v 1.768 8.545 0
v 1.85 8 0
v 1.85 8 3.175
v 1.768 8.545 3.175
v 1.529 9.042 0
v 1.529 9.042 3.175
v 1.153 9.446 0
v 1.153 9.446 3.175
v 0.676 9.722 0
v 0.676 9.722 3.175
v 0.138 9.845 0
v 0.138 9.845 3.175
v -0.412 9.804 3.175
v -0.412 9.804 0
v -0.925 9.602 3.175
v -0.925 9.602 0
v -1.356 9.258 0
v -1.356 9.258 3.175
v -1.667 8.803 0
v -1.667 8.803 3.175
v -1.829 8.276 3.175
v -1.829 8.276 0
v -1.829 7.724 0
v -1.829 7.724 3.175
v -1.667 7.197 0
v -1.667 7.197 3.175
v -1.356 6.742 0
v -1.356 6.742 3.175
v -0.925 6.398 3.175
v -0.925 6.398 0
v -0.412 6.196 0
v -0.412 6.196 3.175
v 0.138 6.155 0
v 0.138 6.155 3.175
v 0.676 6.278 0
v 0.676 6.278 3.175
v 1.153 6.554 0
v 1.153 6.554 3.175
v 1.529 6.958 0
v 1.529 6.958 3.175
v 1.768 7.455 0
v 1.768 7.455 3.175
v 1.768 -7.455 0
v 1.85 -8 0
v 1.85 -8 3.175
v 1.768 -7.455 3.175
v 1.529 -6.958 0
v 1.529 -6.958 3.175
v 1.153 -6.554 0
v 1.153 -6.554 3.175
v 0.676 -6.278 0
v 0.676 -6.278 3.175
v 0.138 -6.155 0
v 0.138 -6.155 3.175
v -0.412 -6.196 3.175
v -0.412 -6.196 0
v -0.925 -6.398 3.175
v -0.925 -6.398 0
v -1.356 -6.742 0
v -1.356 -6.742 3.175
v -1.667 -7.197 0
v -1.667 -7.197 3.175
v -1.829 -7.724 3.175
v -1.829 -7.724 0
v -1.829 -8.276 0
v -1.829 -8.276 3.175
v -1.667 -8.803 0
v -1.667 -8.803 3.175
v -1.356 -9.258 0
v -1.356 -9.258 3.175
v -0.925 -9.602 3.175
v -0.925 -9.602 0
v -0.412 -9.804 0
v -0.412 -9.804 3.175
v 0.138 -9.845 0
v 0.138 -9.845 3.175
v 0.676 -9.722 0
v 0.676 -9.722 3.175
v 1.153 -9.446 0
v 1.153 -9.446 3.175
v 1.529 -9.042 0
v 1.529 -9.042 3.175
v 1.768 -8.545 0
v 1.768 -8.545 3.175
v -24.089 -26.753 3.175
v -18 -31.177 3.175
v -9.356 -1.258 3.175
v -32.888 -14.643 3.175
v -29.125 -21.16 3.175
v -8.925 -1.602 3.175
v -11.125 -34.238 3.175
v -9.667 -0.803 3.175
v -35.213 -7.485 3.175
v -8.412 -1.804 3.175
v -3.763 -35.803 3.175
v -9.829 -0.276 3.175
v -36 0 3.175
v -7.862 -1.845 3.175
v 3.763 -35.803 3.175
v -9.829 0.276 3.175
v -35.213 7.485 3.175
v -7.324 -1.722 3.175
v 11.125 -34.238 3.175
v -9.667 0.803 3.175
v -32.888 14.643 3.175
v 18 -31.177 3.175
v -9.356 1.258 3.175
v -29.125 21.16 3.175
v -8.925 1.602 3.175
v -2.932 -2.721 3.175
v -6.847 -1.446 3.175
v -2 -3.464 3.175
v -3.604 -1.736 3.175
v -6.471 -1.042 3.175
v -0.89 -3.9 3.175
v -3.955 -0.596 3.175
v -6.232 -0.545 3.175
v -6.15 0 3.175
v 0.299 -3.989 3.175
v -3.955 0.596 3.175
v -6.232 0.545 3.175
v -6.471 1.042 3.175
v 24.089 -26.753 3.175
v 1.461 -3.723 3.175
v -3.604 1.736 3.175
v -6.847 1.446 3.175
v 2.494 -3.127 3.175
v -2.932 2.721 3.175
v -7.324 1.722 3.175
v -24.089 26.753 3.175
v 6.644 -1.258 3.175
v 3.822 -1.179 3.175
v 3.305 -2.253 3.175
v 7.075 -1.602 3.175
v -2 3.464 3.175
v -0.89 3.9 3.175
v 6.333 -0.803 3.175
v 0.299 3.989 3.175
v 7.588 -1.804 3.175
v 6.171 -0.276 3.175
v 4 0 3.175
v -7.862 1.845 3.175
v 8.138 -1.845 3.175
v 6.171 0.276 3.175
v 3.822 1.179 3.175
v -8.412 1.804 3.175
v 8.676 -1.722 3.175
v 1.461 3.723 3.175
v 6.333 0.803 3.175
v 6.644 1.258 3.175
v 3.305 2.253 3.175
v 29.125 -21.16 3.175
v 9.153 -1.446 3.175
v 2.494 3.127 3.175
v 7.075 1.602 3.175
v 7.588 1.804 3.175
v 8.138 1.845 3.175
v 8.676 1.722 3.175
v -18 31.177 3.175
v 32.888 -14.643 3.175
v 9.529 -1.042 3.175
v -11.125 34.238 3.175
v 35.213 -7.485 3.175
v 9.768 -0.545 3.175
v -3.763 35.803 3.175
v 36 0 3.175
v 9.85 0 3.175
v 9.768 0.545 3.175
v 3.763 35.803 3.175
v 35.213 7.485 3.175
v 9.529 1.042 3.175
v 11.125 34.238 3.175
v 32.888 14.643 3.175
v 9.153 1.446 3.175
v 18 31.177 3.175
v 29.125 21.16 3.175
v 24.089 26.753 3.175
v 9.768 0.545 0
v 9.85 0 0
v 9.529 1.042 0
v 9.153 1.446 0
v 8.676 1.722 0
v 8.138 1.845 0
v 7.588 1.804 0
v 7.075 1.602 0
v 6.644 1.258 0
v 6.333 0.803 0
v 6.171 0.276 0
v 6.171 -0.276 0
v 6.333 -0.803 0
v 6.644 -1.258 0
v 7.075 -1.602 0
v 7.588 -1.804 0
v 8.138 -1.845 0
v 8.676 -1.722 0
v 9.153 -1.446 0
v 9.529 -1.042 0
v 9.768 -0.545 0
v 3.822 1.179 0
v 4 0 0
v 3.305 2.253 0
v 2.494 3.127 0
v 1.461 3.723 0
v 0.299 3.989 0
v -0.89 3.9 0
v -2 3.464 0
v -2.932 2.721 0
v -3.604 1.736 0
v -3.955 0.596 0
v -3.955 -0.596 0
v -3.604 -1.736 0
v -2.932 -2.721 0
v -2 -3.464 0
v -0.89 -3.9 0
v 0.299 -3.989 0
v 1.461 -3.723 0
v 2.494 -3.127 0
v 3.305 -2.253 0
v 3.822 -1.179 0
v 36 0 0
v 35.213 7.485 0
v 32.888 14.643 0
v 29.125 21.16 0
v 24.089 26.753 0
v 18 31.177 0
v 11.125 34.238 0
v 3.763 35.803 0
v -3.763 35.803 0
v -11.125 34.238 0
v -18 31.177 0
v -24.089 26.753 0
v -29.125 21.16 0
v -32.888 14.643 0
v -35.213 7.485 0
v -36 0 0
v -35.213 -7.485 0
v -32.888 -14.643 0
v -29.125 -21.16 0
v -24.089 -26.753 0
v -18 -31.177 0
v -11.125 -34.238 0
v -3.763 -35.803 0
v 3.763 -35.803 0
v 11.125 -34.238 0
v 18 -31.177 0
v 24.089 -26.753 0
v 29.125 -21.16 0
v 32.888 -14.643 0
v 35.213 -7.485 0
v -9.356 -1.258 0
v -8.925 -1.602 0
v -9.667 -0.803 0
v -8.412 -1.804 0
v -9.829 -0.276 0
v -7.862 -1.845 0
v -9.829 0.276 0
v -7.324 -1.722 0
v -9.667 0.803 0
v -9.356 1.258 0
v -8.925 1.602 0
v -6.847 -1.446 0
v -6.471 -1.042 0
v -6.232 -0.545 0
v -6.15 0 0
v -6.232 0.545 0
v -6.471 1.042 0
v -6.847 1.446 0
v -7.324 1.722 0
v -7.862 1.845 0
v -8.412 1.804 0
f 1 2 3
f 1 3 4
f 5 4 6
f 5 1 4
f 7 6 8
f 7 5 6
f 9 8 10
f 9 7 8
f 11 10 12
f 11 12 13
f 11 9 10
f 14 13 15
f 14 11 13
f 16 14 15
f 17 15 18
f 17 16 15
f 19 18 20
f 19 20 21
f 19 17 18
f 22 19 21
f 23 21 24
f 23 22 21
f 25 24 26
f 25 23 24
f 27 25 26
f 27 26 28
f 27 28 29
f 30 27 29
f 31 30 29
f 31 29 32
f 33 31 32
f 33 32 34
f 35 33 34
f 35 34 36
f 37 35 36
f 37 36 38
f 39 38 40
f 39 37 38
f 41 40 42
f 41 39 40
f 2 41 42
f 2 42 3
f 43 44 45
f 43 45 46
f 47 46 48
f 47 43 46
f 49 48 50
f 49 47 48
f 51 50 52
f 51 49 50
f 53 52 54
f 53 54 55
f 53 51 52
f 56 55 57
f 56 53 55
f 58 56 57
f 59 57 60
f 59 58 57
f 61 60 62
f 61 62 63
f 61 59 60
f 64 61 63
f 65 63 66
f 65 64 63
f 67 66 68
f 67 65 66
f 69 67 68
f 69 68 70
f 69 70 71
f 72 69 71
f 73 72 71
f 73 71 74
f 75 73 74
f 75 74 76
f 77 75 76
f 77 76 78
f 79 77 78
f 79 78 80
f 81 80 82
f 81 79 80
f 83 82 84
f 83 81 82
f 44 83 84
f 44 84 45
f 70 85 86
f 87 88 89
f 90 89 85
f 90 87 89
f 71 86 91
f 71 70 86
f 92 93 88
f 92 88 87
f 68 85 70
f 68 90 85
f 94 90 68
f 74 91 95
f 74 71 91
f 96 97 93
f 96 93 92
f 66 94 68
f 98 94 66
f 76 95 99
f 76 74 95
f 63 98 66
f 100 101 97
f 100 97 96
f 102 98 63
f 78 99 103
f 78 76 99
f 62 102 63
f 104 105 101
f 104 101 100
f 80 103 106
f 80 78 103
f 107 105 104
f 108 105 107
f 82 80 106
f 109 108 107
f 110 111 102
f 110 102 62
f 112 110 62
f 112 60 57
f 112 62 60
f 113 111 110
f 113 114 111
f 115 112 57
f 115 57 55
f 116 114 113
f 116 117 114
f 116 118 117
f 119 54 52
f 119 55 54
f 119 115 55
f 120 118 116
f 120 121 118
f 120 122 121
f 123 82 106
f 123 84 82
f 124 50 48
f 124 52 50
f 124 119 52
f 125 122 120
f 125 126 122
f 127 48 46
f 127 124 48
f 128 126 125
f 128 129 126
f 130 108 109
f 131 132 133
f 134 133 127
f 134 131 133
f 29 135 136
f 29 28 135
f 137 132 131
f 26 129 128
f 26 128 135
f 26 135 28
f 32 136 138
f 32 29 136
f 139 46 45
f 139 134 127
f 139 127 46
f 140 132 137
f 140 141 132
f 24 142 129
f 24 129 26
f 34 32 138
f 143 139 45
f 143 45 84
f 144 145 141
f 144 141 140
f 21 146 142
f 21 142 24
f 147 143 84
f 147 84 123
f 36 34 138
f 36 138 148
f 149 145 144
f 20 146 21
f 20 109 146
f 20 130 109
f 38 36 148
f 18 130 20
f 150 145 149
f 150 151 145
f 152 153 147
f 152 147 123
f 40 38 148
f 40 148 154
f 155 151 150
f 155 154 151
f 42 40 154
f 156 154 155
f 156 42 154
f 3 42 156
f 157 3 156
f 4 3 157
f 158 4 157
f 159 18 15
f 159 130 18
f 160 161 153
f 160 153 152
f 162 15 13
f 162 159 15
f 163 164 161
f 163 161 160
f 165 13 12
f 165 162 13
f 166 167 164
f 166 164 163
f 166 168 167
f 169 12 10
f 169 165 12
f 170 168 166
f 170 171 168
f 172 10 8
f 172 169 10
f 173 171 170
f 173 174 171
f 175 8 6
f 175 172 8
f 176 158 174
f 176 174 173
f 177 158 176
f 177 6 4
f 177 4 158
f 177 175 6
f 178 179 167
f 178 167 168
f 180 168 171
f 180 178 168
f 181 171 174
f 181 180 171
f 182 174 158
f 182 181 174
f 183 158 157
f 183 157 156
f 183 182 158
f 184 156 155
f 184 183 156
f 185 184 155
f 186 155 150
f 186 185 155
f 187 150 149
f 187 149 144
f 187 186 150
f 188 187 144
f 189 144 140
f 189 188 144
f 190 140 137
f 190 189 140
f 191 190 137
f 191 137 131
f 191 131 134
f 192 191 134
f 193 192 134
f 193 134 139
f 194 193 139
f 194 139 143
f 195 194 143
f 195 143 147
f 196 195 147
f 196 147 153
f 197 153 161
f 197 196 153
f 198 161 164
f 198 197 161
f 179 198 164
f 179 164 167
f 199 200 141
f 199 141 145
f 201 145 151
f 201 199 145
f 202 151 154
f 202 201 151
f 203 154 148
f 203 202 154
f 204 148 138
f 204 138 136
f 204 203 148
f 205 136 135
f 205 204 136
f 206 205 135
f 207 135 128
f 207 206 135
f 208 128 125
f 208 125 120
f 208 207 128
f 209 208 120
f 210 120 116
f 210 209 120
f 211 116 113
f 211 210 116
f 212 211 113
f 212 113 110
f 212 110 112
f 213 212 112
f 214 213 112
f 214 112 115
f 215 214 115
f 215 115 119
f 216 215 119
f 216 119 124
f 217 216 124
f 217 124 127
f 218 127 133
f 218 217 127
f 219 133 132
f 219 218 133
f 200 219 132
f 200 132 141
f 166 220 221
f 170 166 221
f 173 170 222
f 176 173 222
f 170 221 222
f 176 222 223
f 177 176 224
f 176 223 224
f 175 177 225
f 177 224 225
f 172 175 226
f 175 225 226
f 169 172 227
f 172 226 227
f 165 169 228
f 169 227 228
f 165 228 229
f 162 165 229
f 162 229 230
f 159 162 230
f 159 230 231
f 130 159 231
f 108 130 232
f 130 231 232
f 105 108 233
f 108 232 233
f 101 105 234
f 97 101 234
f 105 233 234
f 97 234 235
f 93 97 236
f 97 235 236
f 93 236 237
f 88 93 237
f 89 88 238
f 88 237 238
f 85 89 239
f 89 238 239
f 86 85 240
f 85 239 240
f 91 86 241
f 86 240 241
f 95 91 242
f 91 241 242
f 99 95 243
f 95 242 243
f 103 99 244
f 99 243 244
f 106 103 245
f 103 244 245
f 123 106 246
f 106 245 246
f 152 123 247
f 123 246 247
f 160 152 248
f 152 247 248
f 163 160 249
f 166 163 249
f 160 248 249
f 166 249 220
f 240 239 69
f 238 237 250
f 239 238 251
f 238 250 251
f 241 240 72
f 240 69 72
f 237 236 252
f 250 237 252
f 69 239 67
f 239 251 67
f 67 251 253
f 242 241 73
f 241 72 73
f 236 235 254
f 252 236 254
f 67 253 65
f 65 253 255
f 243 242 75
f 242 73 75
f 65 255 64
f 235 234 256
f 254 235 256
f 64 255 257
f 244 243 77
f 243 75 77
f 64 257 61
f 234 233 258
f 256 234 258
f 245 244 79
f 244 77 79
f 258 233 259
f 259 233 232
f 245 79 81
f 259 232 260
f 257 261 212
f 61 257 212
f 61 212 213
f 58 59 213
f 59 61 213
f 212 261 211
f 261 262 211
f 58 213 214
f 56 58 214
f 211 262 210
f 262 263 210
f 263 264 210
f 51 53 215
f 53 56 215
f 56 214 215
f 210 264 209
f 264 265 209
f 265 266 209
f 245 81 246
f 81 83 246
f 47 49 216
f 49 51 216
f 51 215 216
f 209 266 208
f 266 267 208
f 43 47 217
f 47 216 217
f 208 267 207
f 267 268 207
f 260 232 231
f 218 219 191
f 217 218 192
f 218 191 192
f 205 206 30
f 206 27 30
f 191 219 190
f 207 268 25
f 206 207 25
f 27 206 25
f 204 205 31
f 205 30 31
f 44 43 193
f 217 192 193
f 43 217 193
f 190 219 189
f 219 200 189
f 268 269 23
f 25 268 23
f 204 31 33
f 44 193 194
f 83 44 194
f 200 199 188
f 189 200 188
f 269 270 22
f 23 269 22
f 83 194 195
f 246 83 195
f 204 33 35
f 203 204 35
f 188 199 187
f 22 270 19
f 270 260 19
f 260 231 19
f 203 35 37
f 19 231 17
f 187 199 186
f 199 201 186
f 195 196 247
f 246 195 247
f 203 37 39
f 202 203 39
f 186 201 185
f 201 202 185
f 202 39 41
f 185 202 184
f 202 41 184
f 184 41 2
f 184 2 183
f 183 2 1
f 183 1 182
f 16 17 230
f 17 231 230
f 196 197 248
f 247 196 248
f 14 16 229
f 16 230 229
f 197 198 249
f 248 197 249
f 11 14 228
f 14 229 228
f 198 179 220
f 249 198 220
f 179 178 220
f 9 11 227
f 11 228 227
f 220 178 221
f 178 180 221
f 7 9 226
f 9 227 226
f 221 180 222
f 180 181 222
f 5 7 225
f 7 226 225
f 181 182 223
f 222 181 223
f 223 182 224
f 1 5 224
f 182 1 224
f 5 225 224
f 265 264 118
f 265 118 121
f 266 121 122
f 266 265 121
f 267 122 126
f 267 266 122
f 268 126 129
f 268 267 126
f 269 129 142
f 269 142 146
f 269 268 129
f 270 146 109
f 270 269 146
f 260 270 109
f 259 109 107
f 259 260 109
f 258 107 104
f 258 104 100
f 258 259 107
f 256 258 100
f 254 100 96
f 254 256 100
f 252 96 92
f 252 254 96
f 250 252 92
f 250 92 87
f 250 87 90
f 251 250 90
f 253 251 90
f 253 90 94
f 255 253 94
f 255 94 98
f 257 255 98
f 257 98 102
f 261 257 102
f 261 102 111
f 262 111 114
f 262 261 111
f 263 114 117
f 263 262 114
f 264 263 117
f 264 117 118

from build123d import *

# Parameters (mm, degrees)
SKETCH1_R           = 4
SKETCH1_R_2         = 1.85
BOSS_EXTRUDE1_DEPTH = 3.175


with BuildPart() as part:
    # Sketch1 → Boss-Extrude1 (new body)
    with BuildSketch(Plane.XY):
        with BuildLine():
            ThreePointArc((-36, 0), (0, -36), (36, 0))
            ThreePointArc((36, 0), (0, 36), (-36, 0))
        make_face()
        Circle(SKETCH1_R, mode=Mode.SUBTRACT)
        with Locations((-8, 0)):
            Circle(SKETCH1_R_2, mode=Mode.SUBTRACT)
        with Locations((0, -8)):
            Circle(SKETCH1_R_2, mode=Mode.SUBTRACT)
        with Locations((0, 8)):
            Circle(SKETCH1_R_2, mode=Mode.SUBTRACT)
        with Locations((8, 0)):
            Circle(SKETCH1_R_2, mode=Mode.SUBTRACT)
    extrude(amount=BOSS_EXTRUDE1_DEPTH)


solid = part.part
